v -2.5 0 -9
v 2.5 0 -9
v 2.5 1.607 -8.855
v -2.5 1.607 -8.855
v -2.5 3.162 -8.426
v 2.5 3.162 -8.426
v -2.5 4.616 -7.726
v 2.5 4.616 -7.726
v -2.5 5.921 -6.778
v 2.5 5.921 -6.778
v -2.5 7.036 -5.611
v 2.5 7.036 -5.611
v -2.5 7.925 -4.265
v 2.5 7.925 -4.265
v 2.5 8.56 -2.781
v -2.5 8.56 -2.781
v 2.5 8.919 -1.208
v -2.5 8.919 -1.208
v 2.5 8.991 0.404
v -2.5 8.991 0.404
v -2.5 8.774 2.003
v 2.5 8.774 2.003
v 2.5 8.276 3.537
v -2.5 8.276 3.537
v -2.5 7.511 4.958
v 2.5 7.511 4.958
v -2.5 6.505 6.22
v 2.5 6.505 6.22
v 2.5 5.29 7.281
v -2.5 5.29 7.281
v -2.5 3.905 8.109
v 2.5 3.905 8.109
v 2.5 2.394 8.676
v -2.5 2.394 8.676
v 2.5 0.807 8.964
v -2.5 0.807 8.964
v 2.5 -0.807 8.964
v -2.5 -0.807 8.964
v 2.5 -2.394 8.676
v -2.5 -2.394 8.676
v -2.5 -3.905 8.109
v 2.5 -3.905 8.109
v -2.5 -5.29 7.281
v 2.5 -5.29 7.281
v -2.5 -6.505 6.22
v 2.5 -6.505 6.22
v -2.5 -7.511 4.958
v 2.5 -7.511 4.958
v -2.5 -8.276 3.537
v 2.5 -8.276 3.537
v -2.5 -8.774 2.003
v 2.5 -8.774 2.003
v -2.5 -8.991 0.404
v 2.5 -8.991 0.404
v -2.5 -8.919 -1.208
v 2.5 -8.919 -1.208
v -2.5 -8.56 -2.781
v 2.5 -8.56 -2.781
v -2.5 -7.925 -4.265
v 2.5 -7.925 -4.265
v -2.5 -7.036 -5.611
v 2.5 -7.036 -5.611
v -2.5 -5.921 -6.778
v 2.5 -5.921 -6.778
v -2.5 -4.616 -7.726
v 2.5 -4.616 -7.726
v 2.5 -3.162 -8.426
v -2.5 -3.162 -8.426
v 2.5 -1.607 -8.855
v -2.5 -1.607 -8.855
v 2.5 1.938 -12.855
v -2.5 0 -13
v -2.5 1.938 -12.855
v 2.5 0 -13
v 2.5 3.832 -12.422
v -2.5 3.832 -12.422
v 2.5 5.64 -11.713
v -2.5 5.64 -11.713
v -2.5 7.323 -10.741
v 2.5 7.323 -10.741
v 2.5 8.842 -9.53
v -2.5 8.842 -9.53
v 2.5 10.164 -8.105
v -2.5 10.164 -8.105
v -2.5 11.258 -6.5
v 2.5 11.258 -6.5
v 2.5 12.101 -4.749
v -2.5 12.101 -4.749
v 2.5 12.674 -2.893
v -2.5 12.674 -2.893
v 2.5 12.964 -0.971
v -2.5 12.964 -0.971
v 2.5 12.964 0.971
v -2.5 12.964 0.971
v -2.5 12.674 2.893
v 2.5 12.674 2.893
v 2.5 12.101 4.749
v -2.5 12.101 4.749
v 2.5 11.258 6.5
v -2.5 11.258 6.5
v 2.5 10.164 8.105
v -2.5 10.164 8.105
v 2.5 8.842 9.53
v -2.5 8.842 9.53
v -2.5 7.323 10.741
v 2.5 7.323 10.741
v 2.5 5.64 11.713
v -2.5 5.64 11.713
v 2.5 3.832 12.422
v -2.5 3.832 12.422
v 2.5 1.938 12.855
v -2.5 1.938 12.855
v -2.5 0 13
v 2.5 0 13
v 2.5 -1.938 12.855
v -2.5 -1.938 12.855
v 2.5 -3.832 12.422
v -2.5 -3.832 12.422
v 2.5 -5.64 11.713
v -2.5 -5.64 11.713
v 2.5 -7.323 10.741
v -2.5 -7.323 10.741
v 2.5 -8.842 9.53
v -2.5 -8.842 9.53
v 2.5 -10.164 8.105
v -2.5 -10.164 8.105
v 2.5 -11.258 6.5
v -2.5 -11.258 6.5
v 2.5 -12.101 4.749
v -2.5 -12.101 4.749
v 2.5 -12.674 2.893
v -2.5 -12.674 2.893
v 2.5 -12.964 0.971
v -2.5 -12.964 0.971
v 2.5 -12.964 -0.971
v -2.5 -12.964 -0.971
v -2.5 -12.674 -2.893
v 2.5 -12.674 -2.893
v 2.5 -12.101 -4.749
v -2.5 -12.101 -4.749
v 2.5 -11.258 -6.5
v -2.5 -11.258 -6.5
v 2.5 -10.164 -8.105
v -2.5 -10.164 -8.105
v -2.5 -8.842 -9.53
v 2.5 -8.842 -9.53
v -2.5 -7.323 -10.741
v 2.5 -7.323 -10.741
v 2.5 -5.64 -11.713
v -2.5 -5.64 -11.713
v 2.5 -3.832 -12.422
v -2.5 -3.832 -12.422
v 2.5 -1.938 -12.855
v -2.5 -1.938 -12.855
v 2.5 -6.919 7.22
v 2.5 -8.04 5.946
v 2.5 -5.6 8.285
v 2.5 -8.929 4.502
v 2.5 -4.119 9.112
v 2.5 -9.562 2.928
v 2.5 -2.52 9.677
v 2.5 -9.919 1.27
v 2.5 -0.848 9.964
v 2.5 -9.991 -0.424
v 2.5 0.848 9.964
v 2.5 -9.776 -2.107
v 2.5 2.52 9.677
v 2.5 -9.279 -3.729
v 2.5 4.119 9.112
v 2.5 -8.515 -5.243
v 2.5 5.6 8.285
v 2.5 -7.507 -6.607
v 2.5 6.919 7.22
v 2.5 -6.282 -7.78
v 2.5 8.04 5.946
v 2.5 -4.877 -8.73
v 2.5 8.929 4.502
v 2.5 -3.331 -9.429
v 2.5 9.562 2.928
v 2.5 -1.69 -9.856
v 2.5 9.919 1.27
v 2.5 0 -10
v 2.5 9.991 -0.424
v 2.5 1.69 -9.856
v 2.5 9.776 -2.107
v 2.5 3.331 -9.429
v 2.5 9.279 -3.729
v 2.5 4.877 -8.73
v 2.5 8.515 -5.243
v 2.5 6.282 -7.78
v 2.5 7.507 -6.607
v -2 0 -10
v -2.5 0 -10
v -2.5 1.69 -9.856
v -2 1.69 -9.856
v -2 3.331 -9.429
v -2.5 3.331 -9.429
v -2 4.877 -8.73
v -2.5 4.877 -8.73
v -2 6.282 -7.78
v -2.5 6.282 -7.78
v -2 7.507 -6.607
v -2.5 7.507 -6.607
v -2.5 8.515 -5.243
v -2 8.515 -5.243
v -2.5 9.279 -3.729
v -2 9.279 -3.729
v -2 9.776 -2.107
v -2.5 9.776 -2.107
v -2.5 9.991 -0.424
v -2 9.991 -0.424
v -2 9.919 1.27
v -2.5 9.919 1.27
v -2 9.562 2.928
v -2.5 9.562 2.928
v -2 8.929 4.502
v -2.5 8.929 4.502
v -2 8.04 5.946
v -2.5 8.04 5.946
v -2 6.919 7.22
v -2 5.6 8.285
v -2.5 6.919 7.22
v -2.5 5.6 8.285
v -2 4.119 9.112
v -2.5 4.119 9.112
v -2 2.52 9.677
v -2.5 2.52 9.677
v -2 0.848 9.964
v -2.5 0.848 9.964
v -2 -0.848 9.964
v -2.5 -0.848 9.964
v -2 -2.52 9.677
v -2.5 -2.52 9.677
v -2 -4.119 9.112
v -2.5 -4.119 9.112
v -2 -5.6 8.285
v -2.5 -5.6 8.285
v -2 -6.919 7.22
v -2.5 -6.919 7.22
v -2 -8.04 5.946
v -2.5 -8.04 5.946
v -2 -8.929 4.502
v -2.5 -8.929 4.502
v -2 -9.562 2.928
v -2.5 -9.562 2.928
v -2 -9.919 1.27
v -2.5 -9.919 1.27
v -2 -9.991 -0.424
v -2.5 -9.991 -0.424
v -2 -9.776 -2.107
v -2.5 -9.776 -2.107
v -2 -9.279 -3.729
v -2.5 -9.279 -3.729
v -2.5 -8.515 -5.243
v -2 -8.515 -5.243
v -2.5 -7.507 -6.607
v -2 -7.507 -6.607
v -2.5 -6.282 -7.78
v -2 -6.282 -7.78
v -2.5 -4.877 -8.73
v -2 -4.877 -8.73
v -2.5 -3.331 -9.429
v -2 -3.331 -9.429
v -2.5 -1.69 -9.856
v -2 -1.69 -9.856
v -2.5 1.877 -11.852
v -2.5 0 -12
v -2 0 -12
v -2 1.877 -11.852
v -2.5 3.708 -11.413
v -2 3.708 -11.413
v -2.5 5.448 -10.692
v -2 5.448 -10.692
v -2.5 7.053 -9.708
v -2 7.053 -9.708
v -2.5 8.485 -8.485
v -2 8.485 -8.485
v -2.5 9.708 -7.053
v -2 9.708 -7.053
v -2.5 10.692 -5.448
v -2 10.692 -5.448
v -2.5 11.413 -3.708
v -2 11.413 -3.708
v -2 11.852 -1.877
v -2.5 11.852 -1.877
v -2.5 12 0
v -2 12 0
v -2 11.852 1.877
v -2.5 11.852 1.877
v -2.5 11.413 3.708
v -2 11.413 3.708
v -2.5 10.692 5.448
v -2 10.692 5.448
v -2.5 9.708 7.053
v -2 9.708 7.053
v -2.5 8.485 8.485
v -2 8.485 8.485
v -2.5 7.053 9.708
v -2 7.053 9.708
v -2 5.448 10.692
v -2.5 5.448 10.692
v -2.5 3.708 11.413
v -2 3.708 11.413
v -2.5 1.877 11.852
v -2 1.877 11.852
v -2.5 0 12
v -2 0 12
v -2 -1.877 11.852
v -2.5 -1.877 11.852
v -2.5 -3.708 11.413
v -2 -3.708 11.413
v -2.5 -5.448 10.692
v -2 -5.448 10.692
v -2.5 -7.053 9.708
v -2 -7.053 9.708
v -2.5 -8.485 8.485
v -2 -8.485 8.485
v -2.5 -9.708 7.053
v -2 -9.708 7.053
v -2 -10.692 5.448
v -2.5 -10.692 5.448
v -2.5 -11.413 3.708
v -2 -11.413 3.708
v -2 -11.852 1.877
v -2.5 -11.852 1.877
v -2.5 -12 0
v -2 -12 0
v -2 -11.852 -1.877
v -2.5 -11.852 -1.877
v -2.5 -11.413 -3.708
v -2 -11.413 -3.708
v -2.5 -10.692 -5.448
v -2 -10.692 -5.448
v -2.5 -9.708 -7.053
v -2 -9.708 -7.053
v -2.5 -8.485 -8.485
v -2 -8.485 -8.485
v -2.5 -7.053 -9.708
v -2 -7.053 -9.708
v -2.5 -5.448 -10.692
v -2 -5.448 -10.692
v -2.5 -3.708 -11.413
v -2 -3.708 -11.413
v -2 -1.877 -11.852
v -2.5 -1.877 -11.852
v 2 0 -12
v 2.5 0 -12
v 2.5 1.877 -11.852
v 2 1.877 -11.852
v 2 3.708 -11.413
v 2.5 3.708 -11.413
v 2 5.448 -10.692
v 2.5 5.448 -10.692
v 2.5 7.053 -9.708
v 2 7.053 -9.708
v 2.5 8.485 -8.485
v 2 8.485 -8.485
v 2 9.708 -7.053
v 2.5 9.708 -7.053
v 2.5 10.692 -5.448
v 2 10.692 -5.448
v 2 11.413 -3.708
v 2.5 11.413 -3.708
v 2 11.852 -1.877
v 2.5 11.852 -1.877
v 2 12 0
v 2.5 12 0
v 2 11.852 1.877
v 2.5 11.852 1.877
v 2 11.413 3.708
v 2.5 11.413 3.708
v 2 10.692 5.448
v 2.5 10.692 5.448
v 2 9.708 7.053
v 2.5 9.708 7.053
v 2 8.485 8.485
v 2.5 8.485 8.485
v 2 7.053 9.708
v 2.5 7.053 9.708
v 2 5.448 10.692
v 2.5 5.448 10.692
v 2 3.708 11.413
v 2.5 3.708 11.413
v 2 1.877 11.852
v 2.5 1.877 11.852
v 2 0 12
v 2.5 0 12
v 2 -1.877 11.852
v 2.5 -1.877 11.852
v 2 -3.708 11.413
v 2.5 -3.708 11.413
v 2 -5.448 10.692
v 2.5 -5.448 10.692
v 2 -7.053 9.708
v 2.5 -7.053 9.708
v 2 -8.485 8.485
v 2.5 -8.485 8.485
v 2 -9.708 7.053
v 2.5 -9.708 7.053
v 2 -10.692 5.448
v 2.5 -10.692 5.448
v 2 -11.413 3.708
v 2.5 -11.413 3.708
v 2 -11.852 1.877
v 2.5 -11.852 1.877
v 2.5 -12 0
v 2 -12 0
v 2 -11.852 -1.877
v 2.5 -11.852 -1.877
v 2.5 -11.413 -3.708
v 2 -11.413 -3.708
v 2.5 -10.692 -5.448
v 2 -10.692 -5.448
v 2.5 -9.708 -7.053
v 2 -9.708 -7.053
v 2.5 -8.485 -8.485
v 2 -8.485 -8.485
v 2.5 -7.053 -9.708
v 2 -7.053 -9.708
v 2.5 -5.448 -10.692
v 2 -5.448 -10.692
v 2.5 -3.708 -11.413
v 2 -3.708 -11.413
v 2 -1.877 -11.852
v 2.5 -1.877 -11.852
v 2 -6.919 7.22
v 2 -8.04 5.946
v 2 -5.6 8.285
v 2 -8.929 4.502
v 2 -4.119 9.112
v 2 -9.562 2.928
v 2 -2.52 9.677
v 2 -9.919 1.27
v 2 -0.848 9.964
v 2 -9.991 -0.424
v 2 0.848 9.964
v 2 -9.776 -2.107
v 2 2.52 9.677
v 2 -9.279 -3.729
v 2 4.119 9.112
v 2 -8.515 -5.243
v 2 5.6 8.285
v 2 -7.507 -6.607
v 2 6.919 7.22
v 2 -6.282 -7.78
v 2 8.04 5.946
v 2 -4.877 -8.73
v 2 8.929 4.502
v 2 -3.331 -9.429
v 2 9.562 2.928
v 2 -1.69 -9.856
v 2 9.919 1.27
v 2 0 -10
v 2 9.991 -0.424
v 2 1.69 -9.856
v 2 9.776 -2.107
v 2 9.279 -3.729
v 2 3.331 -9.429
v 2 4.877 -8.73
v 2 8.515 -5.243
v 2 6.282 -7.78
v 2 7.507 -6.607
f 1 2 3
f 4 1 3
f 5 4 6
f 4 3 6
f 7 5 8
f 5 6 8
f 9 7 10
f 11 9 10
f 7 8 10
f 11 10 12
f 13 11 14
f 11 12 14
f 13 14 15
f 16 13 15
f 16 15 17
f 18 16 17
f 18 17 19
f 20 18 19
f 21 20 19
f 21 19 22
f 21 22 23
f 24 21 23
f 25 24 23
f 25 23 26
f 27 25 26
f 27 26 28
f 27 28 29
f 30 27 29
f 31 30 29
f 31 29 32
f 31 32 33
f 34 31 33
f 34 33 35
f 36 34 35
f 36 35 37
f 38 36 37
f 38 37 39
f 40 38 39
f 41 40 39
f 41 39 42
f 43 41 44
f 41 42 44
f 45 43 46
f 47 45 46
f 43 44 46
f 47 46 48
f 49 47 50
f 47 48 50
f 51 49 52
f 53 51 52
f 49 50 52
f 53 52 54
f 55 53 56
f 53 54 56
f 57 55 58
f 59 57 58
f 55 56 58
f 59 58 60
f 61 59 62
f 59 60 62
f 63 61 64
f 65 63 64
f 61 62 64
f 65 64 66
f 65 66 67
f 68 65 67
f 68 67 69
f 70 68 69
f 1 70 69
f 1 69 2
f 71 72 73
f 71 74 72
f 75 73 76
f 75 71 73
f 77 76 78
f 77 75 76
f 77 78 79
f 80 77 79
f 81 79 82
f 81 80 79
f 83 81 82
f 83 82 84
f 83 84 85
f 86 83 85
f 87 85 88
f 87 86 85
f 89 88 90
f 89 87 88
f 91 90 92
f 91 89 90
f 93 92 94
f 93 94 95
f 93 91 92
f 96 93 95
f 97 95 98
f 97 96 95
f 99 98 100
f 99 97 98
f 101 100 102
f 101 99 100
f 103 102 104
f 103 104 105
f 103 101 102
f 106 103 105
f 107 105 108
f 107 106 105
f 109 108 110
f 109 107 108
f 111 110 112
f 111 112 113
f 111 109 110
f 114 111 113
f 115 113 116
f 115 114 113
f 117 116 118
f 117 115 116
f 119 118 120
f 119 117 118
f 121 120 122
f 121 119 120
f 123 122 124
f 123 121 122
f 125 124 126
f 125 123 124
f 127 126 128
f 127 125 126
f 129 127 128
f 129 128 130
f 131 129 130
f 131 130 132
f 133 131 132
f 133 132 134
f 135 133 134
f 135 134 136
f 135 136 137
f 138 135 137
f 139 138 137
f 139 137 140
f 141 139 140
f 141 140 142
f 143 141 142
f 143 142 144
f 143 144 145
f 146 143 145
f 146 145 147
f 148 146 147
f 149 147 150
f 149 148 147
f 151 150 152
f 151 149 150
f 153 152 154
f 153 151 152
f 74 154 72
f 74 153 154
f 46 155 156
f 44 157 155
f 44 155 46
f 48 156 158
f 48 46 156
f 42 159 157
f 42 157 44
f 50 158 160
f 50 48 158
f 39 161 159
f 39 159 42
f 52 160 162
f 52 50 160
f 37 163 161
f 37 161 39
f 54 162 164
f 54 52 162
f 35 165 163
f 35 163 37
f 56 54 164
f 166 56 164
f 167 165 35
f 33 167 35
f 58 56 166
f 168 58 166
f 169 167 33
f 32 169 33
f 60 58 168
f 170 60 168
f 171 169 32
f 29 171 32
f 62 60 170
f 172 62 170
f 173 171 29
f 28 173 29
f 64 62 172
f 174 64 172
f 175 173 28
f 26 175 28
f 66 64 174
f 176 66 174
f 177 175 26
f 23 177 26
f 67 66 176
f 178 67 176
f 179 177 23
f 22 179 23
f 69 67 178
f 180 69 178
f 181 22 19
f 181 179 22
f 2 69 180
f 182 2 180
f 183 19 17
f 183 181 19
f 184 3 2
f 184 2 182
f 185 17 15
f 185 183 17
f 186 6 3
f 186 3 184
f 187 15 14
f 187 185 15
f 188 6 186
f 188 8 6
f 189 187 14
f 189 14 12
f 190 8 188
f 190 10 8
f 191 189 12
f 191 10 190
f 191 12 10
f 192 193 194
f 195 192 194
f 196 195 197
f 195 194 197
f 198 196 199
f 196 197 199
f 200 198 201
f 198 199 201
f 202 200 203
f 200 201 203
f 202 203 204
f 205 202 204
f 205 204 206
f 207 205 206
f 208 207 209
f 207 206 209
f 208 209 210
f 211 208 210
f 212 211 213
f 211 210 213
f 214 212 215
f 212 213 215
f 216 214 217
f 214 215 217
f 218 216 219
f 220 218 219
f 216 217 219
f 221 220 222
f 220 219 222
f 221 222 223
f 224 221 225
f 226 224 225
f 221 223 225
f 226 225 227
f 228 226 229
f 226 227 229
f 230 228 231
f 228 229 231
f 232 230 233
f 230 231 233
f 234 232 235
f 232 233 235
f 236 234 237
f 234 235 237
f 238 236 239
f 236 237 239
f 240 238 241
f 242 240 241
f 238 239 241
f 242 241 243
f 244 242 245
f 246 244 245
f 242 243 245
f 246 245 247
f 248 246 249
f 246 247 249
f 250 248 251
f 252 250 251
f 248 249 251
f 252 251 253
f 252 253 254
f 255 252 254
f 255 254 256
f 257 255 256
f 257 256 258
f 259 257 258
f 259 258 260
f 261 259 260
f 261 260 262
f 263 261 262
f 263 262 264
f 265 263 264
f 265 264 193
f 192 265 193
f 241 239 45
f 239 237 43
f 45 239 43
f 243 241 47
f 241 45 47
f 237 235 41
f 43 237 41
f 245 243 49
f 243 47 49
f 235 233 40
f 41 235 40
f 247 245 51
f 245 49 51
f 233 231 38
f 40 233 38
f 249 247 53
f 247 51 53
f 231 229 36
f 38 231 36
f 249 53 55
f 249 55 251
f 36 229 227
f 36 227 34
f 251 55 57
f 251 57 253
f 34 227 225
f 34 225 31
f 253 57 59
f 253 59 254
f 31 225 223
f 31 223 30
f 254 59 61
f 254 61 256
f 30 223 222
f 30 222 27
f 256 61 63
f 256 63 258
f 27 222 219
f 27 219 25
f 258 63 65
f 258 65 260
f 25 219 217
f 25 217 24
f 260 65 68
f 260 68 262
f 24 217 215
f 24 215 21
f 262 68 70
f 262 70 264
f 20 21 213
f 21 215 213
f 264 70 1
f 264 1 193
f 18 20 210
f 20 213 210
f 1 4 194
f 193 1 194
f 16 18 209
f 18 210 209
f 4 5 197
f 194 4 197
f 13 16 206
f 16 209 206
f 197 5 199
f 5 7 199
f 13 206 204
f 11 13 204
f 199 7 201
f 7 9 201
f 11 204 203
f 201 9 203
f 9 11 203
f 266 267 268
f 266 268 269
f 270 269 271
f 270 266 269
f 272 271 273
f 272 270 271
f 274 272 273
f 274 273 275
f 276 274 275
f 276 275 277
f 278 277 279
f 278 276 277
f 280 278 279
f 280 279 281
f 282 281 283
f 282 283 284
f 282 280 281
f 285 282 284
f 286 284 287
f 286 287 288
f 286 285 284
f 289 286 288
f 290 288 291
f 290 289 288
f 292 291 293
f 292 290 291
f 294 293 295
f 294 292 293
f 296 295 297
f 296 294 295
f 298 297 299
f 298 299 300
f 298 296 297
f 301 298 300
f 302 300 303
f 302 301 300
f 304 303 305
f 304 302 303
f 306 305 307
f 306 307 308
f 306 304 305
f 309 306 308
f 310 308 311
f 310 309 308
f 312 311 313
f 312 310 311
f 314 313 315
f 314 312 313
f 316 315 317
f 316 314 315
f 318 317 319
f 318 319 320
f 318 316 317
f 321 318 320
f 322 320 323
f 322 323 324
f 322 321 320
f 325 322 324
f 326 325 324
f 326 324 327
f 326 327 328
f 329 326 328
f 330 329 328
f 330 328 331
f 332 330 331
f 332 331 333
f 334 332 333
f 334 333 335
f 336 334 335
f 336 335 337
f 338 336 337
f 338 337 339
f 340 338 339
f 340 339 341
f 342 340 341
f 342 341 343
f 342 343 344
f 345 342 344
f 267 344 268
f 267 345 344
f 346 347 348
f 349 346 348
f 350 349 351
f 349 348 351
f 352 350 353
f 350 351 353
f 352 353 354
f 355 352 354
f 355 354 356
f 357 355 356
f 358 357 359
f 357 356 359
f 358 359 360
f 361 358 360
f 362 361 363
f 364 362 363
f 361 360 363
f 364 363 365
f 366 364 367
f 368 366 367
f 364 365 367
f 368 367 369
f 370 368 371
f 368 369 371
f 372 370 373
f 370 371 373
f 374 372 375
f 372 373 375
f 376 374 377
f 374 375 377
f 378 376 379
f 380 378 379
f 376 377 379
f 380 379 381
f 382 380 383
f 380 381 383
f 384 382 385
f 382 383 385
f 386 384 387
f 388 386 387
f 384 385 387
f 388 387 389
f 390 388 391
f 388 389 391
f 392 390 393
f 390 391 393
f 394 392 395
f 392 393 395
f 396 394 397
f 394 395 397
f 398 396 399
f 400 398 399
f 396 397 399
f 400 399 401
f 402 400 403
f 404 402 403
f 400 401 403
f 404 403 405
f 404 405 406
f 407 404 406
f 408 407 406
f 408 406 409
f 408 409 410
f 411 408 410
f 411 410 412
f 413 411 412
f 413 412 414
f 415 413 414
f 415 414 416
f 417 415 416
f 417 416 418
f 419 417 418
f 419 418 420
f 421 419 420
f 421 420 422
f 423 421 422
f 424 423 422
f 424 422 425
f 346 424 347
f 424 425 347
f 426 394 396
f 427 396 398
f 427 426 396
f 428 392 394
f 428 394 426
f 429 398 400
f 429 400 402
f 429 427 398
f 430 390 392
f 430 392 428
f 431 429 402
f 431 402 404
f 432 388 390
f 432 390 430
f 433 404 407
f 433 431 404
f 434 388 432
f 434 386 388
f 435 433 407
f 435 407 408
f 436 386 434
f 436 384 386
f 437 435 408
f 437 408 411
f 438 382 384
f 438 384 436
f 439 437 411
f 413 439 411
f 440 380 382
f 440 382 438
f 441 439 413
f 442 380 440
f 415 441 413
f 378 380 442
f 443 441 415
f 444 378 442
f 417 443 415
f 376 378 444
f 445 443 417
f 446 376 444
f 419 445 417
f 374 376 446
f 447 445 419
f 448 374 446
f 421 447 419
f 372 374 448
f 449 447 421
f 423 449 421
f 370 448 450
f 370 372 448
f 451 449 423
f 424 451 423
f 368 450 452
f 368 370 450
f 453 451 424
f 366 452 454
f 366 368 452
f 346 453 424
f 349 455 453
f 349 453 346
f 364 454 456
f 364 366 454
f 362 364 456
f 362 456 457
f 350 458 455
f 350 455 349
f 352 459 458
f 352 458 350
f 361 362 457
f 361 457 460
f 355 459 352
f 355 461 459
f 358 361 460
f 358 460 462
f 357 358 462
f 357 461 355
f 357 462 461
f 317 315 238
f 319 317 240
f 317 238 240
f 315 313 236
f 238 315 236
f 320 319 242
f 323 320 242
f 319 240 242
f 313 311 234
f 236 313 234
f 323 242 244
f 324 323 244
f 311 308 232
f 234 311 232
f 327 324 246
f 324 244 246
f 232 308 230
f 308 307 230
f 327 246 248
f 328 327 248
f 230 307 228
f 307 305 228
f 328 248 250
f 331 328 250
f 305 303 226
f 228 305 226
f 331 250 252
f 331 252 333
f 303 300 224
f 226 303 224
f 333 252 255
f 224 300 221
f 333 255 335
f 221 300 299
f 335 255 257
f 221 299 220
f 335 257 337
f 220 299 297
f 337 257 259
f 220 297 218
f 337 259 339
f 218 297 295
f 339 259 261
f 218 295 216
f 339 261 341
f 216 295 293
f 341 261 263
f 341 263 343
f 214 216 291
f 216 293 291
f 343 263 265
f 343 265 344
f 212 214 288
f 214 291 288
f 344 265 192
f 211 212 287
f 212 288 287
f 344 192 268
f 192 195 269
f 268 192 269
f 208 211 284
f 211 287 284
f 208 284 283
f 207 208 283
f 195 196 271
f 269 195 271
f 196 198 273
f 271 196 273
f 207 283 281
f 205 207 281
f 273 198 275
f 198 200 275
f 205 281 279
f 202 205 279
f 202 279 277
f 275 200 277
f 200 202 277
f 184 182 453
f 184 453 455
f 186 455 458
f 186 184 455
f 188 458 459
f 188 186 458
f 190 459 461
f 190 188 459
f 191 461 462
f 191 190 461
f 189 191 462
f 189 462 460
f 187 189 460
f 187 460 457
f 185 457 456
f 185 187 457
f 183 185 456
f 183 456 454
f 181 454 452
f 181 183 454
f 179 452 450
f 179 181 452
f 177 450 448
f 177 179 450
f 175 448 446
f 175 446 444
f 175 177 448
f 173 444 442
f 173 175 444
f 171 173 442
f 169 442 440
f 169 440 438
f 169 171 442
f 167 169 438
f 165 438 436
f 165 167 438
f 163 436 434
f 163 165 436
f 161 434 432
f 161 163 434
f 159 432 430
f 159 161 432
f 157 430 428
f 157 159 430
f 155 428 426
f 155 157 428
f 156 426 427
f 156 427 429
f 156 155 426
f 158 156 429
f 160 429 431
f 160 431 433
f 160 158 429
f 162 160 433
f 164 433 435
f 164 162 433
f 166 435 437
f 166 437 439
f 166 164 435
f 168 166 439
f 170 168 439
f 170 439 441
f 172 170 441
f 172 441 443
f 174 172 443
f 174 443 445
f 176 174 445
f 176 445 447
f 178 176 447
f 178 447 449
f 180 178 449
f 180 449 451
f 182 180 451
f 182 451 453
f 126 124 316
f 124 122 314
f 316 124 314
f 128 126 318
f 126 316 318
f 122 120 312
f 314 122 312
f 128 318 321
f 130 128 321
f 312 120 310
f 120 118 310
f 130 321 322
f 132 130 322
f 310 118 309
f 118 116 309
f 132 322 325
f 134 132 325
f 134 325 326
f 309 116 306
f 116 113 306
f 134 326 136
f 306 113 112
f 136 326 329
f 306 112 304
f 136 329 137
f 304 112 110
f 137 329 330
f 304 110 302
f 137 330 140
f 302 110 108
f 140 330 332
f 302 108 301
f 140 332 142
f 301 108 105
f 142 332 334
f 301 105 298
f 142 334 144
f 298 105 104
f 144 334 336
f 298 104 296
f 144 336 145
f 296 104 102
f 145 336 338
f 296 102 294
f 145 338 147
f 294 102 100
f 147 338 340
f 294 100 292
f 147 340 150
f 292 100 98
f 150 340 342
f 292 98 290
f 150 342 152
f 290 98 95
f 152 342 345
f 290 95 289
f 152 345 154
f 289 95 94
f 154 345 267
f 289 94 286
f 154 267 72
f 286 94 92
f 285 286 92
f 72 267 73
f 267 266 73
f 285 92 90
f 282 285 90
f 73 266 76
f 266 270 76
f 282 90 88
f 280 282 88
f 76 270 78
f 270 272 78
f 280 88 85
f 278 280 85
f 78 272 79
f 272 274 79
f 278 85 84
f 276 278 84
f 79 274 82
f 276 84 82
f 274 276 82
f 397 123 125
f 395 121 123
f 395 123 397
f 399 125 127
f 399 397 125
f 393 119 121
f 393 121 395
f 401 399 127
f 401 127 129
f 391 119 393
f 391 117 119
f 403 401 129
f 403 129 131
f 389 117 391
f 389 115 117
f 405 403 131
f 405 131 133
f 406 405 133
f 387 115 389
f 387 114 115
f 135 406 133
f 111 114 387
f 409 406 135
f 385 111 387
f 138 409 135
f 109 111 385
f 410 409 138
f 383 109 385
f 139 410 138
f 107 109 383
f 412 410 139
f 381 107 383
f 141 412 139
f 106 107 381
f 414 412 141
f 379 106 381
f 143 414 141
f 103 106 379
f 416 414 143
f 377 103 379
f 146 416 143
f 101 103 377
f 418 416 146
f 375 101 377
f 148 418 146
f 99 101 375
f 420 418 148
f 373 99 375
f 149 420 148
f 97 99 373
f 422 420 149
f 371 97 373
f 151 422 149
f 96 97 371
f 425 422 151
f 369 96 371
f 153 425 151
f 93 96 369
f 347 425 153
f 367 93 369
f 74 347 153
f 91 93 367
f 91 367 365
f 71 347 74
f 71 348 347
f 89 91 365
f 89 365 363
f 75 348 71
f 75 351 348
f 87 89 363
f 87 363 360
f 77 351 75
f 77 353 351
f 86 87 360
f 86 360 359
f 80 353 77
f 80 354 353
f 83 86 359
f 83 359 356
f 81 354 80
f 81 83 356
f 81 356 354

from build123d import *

# Parameters (mm, degrees)
SKETCH2_R           = 13
BOSS_EXTRUDE1_DEPTH = 2.5
SKETCH3_R           = 9
CUT_EXTRUDE1_DEPTH  = 6
SKETCH4_R           = 12
SKETCH4_R_2         = 11
SKETCH4_R_3         = 10
CUT_EXTRUDE2_DEPTH  = 0.5


with BuildPart() as part:
    # Sketch2 → Boss-Extrude1 (new, symmetric)
    with BuildSketch(Plane(origin=(0, 0, 0), x_dir=(0, 0, -1), z_dir=(1, 0, 0))):
        Circle(SKETCH2_R)
    extrude(amount=BOSS_EXTRUDE1_DEPTH, both=True)

    # Sketch3 → Cut-Extrude1 (cut)
    with BuildSketch(Plane(origin=(2.5, 0, 0), x_dir=(0, 0, -1), z_dir=(1, 0, 0))):
        Circle(SKETCH3_R)
    extrude(amount=-CUT_EXTRUDE1_DEPTH, mode=Mode.SUBTRACT)

    # Sketch4 → Cut-Extrude2 (cut)
    with BuildSketch(Plane(origin=(2.5, 0, 0), x_dir=(0, 0, -1), z_dir=(1, 0, 0))):
        Circle(SKETCH4_R)
        Circle(SKETCH4_R_2, mode=Mode.SUBTRACT)
        Circle(SKETCH4_R_2)
        Circle(SKETCH4_R_3, mode=Mode.SUBTRACT)
    cut_extrude2 = extrude(amount=-CUT_EXTRUDE2_DEPTH, mode=Mode.SUBTRACT)

    # Mirror1: Cut-Extrude2 across plane
    add(cut_extrude2.mirror(Plane(origin=(0, 0, 0), x_dir=(0, 0, 1), z_dir=(1, 0, 0))), mode=Mode.SUBTRACT)


solid = part.part
